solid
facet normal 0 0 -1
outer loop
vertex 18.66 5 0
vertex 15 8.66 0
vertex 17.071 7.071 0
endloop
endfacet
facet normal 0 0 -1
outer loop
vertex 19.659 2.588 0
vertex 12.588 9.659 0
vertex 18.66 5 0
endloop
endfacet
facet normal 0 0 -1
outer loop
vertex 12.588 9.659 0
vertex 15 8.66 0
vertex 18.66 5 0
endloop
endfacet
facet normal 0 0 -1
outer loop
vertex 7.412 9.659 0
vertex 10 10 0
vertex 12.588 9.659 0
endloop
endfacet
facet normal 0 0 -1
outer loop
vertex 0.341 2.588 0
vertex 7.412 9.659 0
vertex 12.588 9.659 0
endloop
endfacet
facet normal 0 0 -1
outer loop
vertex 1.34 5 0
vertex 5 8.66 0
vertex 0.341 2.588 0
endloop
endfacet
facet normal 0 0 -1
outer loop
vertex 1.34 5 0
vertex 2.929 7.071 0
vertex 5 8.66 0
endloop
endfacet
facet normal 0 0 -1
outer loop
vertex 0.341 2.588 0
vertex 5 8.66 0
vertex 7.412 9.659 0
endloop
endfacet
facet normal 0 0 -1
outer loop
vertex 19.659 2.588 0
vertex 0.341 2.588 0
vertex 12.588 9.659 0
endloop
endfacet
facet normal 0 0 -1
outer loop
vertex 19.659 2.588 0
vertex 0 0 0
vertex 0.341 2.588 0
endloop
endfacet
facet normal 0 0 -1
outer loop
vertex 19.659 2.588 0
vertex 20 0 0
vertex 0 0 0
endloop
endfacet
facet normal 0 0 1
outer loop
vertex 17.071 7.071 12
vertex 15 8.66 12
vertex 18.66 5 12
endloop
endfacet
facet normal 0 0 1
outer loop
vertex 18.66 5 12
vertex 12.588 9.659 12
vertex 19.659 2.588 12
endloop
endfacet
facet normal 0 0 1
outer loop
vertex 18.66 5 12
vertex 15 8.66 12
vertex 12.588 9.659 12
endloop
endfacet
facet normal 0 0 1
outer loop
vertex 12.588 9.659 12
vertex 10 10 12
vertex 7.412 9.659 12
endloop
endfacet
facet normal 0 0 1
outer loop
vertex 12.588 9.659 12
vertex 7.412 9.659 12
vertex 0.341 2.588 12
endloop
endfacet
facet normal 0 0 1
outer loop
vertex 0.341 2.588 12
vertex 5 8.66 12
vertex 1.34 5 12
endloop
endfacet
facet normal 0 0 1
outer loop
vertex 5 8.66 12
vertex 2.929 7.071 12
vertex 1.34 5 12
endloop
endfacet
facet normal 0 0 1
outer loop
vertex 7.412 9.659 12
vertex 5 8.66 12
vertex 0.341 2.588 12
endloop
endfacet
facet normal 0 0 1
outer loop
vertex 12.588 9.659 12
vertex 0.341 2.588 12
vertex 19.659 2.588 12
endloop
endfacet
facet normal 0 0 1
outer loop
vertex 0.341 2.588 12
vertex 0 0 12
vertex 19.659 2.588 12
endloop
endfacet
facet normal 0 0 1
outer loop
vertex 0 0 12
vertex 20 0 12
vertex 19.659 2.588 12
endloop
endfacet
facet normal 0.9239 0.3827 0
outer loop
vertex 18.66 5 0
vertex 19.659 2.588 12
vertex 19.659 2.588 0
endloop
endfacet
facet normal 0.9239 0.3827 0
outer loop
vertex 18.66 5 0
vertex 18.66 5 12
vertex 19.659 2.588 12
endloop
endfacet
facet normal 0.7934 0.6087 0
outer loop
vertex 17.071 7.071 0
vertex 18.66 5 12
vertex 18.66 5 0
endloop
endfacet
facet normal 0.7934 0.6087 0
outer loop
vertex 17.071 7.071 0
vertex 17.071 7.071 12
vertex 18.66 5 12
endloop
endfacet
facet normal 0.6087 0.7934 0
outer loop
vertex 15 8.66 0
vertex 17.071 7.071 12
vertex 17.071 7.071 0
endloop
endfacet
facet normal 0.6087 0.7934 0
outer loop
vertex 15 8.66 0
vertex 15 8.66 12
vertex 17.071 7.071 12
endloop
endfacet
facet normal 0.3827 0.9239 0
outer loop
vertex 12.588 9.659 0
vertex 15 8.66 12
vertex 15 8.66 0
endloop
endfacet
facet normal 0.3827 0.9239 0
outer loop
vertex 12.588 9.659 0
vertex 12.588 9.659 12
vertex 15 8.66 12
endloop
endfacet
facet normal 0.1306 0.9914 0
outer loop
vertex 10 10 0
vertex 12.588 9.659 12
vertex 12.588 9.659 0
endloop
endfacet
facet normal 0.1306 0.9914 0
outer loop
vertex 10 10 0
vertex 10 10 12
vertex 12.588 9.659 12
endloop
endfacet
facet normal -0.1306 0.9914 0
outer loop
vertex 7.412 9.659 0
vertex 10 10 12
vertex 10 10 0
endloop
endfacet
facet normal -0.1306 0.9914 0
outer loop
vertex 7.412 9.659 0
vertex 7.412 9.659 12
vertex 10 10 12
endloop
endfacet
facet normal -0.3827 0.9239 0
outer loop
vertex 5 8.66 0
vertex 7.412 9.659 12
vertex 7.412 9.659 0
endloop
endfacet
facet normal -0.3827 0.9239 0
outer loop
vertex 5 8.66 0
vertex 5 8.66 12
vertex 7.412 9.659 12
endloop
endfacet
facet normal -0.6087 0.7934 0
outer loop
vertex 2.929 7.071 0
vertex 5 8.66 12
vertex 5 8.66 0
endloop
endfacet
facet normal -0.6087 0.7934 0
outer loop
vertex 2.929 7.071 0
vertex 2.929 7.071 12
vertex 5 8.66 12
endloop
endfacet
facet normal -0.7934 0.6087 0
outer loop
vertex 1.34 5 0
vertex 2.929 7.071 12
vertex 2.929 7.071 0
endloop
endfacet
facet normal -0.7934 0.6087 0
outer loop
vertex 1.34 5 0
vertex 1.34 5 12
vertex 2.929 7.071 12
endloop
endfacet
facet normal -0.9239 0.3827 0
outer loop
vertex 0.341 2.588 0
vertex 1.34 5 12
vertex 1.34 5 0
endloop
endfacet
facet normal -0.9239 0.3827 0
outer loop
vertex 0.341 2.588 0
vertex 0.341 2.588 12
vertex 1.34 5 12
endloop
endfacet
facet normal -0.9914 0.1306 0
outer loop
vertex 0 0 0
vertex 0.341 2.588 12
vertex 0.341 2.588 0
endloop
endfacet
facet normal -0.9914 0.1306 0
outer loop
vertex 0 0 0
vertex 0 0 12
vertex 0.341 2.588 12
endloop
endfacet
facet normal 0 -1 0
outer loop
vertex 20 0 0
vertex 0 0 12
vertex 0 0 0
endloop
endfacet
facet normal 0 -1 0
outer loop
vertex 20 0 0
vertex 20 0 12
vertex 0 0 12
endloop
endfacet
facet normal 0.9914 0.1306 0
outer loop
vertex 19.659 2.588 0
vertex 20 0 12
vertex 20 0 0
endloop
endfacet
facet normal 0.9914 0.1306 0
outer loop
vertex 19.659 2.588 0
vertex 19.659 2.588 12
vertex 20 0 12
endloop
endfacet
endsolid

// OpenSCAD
$fn = 32;

// ----------------------------------------------------------------------
// Key bar: woodruff key, 12 mm thick
// ----------------------------------------------------------------------

// --- parameters (mm) ---
profile_height = 12;      // extrusion height
profile_points = 13;      // points of the closed outline

profile = [[20, 0], [19.659, 2.588], [18.66, 5], [17.071, 7.071], [15, 8.66], [12.588, 9.659], [10, 10], [7.412, 9.659], [5, 8.66], [2.929, 7.071], [1.34, 5], [0.341, 2.588], [0, 0]];  // single closed polygon, 13 points, counter clockwise

// --- the one profile operation ---
linear_extrude(height = profile_height) polygon(points = profile);
